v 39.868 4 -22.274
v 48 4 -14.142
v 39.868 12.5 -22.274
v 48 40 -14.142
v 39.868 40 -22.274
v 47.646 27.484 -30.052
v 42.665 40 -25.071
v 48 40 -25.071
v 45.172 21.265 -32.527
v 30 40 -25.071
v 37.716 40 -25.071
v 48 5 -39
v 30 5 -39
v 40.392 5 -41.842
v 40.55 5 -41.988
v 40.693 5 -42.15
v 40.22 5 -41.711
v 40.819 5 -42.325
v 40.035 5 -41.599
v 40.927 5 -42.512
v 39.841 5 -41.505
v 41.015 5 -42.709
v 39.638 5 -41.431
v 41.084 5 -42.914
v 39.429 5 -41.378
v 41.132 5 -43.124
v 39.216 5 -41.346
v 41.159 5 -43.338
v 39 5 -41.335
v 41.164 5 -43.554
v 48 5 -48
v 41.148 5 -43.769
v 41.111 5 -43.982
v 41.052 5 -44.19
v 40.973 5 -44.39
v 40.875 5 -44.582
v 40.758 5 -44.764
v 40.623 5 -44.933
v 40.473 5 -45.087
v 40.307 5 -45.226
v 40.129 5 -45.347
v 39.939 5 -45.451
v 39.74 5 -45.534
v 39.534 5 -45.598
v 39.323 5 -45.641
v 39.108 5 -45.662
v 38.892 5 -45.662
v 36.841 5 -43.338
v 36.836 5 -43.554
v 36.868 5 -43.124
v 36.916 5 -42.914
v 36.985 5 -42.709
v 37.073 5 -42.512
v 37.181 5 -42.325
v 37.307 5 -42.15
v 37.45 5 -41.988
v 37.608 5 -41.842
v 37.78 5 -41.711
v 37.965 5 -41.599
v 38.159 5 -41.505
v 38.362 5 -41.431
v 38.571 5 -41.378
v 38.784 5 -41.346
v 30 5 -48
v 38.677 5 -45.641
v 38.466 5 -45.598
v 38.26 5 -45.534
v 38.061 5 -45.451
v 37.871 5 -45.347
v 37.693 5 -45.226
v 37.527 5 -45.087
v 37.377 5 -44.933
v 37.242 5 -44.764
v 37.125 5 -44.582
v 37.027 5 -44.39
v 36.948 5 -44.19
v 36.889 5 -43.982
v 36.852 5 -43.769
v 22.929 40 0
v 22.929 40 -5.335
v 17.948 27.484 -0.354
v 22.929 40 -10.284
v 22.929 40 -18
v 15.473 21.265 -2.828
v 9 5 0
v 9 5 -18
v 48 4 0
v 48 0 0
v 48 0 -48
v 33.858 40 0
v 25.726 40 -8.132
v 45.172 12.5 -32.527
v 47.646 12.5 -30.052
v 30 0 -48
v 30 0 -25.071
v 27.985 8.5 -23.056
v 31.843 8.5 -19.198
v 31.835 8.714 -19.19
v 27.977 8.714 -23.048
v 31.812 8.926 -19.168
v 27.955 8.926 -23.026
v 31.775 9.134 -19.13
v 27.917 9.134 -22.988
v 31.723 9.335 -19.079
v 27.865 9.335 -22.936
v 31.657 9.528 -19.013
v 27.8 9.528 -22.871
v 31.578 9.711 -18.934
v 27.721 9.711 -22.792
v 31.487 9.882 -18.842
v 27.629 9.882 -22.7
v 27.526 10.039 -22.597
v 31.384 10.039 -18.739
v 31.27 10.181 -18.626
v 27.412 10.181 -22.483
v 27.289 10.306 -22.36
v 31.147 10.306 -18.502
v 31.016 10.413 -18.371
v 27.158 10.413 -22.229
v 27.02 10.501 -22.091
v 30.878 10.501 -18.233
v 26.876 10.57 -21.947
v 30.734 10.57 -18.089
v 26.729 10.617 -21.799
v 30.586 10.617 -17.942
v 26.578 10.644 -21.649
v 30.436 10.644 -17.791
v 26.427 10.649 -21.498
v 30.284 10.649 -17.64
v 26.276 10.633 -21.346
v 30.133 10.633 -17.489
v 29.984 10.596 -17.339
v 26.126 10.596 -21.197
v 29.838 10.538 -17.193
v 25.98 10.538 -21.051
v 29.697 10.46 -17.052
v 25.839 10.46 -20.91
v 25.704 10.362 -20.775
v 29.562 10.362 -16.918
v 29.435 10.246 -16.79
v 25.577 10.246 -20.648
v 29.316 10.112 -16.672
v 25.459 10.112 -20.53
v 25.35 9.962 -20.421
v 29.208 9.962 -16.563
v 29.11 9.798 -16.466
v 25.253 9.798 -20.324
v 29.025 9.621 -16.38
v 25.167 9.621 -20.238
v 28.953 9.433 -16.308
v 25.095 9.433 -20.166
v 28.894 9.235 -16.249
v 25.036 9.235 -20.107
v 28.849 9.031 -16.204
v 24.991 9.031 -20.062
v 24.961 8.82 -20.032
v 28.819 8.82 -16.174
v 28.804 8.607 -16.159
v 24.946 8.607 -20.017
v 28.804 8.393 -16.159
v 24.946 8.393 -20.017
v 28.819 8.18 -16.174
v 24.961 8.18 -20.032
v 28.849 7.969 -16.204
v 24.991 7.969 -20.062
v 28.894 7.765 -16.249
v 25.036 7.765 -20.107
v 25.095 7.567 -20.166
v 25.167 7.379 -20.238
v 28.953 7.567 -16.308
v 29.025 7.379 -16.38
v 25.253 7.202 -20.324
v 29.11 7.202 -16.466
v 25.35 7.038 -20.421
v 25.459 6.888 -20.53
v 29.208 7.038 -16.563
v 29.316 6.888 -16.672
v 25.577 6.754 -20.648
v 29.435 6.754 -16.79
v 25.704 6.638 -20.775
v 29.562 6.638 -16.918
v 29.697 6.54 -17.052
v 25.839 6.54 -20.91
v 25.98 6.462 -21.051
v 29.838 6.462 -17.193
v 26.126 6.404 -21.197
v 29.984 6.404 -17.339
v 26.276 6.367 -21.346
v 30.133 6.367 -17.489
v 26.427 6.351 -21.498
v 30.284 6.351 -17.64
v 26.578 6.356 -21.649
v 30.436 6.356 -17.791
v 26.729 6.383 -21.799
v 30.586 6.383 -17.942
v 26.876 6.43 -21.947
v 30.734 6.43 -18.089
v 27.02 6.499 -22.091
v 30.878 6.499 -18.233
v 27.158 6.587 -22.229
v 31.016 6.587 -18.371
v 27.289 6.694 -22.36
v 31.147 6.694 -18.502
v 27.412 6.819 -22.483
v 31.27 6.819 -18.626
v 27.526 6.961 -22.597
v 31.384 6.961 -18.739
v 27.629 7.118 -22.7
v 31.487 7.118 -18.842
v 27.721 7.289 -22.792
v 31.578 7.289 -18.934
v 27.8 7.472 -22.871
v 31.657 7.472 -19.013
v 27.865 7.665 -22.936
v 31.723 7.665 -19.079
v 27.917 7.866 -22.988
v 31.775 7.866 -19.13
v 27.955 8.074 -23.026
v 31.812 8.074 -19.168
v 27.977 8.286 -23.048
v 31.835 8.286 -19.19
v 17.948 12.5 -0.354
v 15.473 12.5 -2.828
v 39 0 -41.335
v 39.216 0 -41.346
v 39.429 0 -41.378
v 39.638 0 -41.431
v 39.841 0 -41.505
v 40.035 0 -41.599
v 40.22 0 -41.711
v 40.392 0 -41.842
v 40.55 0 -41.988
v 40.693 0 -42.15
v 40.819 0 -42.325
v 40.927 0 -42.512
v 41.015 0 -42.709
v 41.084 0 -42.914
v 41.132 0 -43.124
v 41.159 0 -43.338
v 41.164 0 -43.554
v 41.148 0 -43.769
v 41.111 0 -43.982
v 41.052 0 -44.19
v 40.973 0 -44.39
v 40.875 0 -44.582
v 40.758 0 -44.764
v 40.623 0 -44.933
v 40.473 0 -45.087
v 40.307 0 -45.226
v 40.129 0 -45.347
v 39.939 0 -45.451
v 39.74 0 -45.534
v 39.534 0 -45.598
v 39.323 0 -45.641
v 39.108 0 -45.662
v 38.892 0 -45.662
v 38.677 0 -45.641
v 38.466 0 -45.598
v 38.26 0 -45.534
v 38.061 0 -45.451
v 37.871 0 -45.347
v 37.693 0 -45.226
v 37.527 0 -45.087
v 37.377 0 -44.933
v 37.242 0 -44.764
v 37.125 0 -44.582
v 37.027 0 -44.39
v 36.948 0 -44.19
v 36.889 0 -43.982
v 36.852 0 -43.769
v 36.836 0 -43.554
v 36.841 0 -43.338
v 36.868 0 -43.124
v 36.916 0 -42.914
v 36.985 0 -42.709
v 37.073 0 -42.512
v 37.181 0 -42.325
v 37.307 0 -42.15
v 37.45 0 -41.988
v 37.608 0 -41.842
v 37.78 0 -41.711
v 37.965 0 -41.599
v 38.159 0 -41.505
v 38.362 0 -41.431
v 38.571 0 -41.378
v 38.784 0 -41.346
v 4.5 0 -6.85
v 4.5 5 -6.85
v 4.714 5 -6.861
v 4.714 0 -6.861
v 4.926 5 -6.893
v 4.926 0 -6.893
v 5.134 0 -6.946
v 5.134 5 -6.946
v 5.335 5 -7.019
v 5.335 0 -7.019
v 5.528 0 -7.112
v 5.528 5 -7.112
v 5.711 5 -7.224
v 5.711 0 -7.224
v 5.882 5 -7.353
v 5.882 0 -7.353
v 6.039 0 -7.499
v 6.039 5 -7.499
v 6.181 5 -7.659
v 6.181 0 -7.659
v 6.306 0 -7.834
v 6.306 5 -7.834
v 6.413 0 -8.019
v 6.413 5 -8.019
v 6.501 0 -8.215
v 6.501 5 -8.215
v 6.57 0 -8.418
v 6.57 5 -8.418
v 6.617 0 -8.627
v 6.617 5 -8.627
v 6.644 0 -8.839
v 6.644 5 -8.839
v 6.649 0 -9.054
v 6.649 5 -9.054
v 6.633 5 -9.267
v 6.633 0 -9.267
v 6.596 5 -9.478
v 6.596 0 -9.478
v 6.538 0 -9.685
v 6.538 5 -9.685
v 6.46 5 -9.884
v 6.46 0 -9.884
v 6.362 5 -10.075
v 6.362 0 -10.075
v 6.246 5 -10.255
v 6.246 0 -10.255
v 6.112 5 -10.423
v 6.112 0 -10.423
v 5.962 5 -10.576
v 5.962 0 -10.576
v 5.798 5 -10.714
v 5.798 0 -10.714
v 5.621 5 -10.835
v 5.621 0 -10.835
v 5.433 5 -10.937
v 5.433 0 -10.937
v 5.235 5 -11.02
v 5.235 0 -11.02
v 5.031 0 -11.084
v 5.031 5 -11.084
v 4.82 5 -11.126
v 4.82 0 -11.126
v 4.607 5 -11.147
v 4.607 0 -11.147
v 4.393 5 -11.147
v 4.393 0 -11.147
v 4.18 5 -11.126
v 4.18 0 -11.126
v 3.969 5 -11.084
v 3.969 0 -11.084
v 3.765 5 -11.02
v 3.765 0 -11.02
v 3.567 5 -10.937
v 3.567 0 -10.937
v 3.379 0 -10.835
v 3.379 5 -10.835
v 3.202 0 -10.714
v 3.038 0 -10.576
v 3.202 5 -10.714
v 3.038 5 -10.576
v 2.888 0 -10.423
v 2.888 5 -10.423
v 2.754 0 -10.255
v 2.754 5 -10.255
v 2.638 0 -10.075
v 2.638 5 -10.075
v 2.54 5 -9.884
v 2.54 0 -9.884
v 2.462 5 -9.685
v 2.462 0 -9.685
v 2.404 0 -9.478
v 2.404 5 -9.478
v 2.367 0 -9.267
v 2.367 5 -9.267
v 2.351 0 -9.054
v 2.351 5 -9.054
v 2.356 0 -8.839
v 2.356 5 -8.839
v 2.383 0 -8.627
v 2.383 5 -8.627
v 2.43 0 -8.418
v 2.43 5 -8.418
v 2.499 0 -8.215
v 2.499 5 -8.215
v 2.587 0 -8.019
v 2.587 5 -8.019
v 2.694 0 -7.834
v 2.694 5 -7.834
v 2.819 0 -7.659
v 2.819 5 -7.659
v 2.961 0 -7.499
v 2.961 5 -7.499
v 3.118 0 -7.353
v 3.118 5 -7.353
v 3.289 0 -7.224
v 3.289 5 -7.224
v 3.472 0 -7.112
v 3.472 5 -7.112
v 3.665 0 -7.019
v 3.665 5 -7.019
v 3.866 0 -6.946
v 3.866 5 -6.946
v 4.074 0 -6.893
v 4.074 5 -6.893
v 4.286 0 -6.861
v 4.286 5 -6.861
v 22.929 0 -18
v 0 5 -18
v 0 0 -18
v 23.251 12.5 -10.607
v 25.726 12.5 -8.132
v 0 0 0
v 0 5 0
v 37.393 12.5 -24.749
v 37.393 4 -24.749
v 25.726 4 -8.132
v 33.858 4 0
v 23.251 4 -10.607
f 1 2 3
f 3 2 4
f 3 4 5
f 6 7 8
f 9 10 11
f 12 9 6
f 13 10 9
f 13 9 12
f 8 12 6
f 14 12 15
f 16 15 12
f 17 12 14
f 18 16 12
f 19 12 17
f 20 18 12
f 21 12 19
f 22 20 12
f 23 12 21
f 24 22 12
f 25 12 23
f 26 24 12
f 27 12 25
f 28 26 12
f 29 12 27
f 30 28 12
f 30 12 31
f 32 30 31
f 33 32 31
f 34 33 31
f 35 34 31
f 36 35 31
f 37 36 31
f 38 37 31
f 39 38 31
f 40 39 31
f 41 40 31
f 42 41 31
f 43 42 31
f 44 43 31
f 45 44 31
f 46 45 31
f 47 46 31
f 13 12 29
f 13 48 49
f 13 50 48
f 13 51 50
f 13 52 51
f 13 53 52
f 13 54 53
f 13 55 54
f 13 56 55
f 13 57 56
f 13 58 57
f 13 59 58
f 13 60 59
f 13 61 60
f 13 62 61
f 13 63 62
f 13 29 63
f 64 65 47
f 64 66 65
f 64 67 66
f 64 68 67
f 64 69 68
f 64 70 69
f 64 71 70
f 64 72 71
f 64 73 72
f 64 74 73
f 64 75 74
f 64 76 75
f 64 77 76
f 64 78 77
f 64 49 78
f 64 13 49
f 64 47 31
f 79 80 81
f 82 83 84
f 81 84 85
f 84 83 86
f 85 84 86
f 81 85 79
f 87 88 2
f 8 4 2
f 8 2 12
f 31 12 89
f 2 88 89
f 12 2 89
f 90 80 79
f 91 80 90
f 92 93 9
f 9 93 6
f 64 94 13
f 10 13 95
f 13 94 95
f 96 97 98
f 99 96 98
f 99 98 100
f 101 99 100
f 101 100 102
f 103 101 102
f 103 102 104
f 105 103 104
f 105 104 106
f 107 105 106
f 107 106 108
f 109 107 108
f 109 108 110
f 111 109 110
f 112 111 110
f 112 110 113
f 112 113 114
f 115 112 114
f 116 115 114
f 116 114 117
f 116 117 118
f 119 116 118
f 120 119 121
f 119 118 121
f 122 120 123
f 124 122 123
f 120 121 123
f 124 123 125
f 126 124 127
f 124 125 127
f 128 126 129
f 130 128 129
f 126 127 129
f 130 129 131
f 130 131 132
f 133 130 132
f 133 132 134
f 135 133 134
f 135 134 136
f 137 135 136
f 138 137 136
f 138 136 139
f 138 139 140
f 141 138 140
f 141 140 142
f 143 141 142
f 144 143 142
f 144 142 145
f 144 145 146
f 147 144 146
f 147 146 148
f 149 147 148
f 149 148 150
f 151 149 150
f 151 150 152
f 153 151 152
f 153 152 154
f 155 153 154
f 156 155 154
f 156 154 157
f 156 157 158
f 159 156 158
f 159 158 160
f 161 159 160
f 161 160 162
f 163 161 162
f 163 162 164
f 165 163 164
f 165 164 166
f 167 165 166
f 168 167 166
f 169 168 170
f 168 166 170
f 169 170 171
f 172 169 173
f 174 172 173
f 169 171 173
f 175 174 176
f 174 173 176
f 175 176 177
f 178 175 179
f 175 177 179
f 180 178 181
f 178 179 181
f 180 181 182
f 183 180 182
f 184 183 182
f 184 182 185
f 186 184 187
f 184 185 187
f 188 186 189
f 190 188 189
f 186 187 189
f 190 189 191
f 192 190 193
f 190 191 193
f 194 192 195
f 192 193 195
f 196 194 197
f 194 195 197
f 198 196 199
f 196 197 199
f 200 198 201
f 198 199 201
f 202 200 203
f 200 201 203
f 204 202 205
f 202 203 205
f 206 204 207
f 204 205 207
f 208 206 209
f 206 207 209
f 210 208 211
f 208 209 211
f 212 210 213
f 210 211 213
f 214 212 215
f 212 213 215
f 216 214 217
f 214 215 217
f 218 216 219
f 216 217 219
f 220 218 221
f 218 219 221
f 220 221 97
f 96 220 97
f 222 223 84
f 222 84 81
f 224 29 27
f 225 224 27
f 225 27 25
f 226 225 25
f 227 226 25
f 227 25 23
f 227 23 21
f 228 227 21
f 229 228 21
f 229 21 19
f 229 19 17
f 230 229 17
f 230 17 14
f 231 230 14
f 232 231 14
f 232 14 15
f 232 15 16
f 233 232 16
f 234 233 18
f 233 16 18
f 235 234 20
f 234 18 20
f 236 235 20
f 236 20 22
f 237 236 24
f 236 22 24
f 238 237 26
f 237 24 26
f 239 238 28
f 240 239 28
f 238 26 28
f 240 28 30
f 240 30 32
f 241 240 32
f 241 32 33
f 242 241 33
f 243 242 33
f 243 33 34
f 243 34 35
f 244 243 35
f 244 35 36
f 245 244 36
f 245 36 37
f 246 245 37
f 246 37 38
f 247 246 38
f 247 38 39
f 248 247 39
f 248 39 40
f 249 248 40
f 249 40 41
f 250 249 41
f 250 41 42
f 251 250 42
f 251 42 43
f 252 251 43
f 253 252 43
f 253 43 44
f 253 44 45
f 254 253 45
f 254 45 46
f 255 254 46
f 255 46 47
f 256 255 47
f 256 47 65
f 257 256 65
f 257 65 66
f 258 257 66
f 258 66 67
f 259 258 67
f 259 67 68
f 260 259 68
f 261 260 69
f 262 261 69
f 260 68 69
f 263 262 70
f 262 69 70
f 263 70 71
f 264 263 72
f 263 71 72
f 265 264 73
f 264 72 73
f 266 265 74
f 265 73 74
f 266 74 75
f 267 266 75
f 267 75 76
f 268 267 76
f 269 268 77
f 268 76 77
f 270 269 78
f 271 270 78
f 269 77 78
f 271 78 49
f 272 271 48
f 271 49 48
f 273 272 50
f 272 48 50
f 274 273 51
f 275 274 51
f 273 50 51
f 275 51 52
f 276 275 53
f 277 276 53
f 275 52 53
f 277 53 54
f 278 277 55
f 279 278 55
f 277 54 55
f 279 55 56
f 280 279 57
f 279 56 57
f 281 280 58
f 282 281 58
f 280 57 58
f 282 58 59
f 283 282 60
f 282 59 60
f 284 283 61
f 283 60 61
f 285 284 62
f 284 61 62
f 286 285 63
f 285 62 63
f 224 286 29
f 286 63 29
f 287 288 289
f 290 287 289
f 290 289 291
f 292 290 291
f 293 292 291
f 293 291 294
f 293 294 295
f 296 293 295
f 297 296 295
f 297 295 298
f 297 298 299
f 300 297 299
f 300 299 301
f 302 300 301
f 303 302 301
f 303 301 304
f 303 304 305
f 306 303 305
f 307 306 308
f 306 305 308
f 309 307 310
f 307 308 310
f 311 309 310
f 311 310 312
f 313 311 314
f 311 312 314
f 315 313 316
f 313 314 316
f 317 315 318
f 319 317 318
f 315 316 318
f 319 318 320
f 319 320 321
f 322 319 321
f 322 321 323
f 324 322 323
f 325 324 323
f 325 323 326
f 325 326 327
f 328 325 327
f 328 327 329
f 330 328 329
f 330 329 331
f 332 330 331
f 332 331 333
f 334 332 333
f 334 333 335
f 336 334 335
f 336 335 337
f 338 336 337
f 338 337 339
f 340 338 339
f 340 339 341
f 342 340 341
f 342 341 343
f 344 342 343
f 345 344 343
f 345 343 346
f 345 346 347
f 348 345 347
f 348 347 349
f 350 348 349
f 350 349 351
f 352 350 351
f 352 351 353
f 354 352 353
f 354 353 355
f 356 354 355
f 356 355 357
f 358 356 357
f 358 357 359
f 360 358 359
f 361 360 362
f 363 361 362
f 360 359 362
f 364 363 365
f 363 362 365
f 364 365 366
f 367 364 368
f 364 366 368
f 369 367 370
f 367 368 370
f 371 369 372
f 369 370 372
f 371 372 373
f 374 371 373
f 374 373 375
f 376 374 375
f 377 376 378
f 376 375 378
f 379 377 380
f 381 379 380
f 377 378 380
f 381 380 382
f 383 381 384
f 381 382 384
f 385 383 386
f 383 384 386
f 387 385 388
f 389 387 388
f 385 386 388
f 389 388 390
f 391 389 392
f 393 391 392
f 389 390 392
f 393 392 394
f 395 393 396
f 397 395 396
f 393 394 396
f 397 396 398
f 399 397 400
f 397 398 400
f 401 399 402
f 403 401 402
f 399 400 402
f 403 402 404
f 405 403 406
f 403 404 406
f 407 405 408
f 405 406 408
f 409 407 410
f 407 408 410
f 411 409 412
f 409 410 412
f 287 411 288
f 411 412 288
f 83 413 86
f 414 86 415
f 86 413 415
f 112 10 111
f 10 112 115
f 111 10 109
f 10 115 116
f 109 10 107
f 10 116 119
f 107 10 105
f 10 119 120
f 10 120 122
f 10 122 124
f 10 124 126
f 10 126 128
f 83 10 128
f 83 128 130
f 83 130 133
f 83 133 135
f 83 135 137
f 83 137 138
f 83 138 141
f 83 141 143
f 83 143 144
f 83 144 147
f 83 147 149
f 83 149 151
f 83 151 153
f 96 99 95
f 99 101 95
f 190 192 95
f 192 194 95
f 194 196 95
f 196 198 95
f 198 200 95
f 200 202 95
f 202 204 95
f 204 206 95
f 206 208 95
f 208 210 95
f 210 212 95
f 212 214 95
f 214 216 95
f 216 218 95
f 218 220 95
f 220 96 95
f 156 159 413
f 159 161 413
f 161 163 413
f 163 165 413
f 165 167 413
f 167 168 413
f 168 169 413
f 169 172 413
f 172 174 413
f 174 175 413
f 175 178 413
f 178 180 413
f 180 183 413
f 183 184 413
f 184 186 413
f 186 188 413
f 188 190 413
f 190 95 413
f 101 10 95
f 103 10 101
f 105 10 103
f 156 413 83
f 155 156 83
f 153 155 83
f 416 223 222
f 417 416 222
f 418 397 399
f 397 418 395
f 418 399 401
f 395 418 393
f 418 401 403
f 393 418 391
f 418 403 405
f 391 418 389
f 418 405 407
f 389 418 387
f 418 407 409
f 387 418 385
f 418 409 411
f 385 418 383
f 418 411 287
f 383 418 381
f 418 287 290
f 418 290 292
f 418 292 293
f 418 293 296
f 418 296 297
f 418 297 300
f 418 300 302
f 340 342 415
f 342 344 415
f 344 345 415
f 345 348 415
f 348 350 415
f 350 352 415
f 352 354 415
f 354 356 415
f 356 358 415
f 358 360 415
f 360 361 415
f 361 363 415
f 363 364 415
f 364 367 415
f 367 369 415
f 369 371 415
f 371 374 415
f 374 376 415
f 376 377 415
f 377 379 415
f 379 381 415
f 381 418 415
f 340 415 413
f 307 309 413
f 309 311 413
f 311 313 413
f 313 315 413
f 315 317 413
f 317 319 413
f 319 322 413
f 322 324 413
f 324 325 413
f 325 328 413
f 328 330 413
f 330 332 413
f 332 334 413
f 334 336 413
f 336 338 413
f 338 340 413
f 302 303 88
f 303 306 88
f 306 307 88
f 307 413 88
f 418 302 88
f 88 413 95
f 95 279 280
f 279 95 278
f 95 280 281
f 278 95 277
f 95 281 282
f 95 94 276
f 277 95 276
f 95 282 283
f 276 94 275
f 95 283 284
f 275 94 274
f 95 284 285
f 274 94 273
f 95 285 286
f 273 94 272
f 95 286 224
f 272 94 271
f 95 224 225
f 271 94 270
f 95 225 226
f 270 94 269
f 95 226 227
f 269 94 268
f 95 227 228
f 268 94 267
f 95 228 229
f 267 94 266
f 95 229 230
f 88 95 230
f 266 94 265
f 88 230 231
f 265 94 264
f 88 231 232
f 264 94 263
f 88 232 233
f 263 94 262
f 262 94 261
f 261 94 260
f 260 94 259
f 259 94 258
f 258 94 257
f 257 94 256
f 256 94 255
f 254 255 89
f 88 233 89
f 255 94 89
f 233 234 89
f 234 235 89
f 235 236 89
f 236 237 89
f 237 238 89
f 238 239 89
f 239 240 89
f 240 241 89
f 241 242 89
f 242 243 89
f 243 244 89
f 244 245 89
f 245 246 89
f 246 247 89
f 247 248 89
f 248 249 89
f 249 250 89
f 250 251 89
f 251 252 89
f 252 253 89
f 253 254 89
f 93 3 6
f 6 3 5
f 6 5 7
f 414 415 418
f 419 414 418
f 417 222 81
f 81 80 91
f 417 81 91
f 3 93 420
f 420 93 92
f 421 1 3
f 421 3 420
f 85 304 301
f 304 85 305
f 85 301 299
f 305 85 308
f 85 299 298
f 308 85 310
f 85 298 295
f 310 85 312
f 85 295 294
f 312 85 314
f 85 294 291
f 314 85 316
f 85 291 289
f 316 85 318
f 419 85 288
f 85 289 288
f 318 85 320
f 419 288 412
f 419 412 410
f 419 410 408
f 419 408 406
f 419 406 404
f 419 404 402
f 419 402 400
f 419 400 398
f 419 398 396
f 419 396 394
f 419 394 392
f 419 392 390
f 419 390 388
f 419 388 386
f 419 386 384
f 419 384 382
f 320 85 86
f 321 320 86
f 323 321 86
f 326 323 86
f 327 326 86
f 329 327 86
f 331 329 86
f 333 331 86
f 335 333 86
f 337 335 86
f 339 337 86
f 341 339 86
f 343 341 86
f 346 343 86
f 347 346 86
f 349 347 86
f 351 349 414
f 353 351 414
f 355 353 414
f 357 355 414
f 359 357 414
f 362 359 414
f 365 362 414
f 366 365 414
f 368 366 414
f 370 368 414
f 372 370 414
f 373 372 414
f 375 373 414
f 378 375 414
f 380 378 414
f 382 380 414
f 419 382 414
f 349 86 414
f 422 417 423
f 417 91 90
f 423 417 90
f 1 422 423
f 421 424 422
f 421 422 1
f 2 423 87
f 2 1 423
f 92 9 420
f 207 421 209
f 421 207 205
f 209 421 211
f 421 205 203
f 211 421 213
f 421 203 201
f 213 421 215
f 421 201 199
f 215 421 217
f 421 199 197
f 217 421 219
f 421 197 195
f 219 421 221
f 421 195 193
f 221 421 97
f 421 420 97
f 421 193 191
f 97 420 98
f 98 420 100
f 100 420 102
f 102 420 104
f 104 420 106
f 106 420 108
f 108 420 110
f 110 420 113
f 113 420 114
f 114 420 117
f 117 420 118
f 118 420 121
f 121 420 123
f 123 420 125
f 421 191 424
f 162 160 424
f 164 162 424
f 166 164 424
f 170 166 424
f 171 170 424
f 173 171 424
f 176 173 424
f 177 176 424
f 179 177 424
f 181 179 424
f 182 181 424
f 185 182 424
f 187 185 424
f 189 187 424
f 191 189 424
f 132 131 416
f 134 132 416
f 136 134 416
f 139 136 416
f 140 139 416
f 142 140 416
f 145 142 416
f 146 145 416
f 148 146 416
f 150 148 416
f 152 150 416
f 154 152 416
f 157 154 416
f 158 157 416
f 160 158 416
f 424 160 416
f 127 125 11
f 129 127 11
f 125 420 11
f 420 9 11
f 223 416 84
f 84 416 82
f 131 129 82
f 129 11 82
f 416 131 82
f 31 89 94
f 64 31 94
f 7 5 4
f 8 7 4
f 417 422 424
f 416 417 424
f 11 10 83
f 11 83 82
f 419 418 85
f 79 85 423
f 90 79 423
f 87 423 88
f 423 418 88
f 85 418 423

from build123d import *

# Parameters (mm, degrees)
SALIENTE_EXTRUIR1_DEPTH = 40
CORTAR_EXTRUIR4_DEPTH   = 36
SALIENTE_EXTRUIR2_DEPTH = 8.5
SALIENTE_EXTRUIR3_DEPTH = 40
CROQUIS5_R              = 2.15
CORTAR_EXTRUIR5_DEPTH   = 12
CORTAR_EXTRUIR7_DEPTH   = 30
CORTAR_EXTRUIR8_DEPTH   = 30
CROQUIS11_R             = 2.165
CORTAR_EXTRUIR9_DEPTH   = 30
CROQUIS12_R             = 2.15
CORTAR_EXTRUIR10_DEPTH  = 30


with BuildPart() as part:
    # Croquis2 → Saliente-Extruir1 (new body)
    with BuildSketch(Plane(origin=(0, 0, 0), x_dir=(1, 0, 0), z_dir=(0, 1, 0))):
        Polygon((0, 0), (48, 0), (48, 48), (30, 48), (30, 18), (0, 18), align=None)
    extrude(amount=SALIENTE_EXTRUIR1_DEPTH)

    # Croquis3 → Cortar-Extruir4 (cut)
    with BuildSketch(Plane(origin=(0, 40, 0), x_dir=(1, 0, 0), z_dir=(0, 1, 0))):
        Polygon((48, 14.142135624), (39.868272016, 22.273863607), (47.646446609, 30.0520382), (45.171572875, 32.526911935), (37.393398282, 24.748737342), (23.251262658, 10.606601718), (15.473088065, 2.828427125), (17.9479618, 0.353553391), (25.726136393, 8.131727984), (33.857864376, 0), (41.815185719, -7.957321343), (55.957321343, 6.184814281), align=None)
    extrude(amount=-CORTAR_EXTRUIR4_DEPTH, mode=Mode.SUBTRACT)

    # Croquis4 → Saliente-Extruir2 (add)
    with BuildSketch(Plane(origin=(0, 4, 0), x_dir=(1, 0, 0), z_dir=(0, 1, 0))):
        Polygon((39.868272016, 22.273863607), (37.393398282, 24.748737342), (45.171572875, 32.526911935), (47.646446609, 30.0520382), align=None)
        Polygon((15.473088065, 2.828427125), (17.9479618, 0.353553391), (25.726136393, 8.131727984), (23.251262658, 10.606601718), align=None)
    extrude(amount=SALIENTE_EXTRUIR2_DEPTH)

    # Croquis6 → Saliente-Extruir3 (add)
    with BuildSketch(Plane(origin=(0, 0, 0), x_dir=(1, 0, 0), z_dir=(0, 1, 0))):
        Polygon((30, 25.070901105), (22.929098895, 18), (30, 18), align=None)
    extrude(amount=SALIENTE_EXTRUIR3_DEPTH)

    # Croquis5 → Cortar-Extruir5 (cut)
    with BuildSketch(Plane(origin=(6.32233047, 0, 6.32233047), x_dir=(0.7071067811865472, 0, -0.7071067811865479), z_dir=(0.7071067811865479, 0, 0.7071067811865472))):
        with Locations((33.941125497, 8.5)):
            Circle(CROQUIS5_R)
    extrude(amount=-CORTAR_EXTRUIR5_DEPTH, mode=Mode.SUBTRACT)

    # Croquis9 → Cortar-Extruir7 (cut)
    with BuildSketch(Plane(origin=(0, 0, -18), x_dir=(-1, 0, 0), z_dir=(0, 0, -1))):
        Polygon((-22.929098895, 40), (-9, 5), (0, 5), (0, 40), align=None)
    extrude(amount=-CORTAR_EXTRUIR7_DEPTH, mode=Mode.SUBTRACT)

    # Croquis10 → Cortar-Extruir8 (cut)
    with BuildSketch(Plane.ZY.offset(-30)):
        Polygon((-25.070901105, 40), (-39, 5), (-48, 5), (-48, 40), align=None)
    extrude(amount=-CORTAR_EXTRUIR8_DEPTH, mode=Mode.SUBTRACT)

    # Croquis11 → Cortar-Extruir9 (cut)
    with BuildSketch(Plane(origin=(0, 5, 0), x_dir=(1, 0, 0), z_dir=(0, 1, 0))):
        with Locations((39, 43.5)):
            Circle(CROQUIS11_R)
    extrude(amount=-CORTAR_EXTRUIR9_DEPTH, mode=Mode.SUBTRACT)

    # Croquis12 → Cortar-Extruir10 (cut)
    with BuildSketch(Plane(origin=(0, 5, 0), x_dir=(1, 0, 0), z_dir=(0, 1, 0))):
        with Locations((4.5, 9)):
            Circle(CROQUIS12_R)
    extrude(amount=-CORTAR_EXTRUIR10_DEPTH, mode=Mode.SUBTRACT)


solid = part.part
